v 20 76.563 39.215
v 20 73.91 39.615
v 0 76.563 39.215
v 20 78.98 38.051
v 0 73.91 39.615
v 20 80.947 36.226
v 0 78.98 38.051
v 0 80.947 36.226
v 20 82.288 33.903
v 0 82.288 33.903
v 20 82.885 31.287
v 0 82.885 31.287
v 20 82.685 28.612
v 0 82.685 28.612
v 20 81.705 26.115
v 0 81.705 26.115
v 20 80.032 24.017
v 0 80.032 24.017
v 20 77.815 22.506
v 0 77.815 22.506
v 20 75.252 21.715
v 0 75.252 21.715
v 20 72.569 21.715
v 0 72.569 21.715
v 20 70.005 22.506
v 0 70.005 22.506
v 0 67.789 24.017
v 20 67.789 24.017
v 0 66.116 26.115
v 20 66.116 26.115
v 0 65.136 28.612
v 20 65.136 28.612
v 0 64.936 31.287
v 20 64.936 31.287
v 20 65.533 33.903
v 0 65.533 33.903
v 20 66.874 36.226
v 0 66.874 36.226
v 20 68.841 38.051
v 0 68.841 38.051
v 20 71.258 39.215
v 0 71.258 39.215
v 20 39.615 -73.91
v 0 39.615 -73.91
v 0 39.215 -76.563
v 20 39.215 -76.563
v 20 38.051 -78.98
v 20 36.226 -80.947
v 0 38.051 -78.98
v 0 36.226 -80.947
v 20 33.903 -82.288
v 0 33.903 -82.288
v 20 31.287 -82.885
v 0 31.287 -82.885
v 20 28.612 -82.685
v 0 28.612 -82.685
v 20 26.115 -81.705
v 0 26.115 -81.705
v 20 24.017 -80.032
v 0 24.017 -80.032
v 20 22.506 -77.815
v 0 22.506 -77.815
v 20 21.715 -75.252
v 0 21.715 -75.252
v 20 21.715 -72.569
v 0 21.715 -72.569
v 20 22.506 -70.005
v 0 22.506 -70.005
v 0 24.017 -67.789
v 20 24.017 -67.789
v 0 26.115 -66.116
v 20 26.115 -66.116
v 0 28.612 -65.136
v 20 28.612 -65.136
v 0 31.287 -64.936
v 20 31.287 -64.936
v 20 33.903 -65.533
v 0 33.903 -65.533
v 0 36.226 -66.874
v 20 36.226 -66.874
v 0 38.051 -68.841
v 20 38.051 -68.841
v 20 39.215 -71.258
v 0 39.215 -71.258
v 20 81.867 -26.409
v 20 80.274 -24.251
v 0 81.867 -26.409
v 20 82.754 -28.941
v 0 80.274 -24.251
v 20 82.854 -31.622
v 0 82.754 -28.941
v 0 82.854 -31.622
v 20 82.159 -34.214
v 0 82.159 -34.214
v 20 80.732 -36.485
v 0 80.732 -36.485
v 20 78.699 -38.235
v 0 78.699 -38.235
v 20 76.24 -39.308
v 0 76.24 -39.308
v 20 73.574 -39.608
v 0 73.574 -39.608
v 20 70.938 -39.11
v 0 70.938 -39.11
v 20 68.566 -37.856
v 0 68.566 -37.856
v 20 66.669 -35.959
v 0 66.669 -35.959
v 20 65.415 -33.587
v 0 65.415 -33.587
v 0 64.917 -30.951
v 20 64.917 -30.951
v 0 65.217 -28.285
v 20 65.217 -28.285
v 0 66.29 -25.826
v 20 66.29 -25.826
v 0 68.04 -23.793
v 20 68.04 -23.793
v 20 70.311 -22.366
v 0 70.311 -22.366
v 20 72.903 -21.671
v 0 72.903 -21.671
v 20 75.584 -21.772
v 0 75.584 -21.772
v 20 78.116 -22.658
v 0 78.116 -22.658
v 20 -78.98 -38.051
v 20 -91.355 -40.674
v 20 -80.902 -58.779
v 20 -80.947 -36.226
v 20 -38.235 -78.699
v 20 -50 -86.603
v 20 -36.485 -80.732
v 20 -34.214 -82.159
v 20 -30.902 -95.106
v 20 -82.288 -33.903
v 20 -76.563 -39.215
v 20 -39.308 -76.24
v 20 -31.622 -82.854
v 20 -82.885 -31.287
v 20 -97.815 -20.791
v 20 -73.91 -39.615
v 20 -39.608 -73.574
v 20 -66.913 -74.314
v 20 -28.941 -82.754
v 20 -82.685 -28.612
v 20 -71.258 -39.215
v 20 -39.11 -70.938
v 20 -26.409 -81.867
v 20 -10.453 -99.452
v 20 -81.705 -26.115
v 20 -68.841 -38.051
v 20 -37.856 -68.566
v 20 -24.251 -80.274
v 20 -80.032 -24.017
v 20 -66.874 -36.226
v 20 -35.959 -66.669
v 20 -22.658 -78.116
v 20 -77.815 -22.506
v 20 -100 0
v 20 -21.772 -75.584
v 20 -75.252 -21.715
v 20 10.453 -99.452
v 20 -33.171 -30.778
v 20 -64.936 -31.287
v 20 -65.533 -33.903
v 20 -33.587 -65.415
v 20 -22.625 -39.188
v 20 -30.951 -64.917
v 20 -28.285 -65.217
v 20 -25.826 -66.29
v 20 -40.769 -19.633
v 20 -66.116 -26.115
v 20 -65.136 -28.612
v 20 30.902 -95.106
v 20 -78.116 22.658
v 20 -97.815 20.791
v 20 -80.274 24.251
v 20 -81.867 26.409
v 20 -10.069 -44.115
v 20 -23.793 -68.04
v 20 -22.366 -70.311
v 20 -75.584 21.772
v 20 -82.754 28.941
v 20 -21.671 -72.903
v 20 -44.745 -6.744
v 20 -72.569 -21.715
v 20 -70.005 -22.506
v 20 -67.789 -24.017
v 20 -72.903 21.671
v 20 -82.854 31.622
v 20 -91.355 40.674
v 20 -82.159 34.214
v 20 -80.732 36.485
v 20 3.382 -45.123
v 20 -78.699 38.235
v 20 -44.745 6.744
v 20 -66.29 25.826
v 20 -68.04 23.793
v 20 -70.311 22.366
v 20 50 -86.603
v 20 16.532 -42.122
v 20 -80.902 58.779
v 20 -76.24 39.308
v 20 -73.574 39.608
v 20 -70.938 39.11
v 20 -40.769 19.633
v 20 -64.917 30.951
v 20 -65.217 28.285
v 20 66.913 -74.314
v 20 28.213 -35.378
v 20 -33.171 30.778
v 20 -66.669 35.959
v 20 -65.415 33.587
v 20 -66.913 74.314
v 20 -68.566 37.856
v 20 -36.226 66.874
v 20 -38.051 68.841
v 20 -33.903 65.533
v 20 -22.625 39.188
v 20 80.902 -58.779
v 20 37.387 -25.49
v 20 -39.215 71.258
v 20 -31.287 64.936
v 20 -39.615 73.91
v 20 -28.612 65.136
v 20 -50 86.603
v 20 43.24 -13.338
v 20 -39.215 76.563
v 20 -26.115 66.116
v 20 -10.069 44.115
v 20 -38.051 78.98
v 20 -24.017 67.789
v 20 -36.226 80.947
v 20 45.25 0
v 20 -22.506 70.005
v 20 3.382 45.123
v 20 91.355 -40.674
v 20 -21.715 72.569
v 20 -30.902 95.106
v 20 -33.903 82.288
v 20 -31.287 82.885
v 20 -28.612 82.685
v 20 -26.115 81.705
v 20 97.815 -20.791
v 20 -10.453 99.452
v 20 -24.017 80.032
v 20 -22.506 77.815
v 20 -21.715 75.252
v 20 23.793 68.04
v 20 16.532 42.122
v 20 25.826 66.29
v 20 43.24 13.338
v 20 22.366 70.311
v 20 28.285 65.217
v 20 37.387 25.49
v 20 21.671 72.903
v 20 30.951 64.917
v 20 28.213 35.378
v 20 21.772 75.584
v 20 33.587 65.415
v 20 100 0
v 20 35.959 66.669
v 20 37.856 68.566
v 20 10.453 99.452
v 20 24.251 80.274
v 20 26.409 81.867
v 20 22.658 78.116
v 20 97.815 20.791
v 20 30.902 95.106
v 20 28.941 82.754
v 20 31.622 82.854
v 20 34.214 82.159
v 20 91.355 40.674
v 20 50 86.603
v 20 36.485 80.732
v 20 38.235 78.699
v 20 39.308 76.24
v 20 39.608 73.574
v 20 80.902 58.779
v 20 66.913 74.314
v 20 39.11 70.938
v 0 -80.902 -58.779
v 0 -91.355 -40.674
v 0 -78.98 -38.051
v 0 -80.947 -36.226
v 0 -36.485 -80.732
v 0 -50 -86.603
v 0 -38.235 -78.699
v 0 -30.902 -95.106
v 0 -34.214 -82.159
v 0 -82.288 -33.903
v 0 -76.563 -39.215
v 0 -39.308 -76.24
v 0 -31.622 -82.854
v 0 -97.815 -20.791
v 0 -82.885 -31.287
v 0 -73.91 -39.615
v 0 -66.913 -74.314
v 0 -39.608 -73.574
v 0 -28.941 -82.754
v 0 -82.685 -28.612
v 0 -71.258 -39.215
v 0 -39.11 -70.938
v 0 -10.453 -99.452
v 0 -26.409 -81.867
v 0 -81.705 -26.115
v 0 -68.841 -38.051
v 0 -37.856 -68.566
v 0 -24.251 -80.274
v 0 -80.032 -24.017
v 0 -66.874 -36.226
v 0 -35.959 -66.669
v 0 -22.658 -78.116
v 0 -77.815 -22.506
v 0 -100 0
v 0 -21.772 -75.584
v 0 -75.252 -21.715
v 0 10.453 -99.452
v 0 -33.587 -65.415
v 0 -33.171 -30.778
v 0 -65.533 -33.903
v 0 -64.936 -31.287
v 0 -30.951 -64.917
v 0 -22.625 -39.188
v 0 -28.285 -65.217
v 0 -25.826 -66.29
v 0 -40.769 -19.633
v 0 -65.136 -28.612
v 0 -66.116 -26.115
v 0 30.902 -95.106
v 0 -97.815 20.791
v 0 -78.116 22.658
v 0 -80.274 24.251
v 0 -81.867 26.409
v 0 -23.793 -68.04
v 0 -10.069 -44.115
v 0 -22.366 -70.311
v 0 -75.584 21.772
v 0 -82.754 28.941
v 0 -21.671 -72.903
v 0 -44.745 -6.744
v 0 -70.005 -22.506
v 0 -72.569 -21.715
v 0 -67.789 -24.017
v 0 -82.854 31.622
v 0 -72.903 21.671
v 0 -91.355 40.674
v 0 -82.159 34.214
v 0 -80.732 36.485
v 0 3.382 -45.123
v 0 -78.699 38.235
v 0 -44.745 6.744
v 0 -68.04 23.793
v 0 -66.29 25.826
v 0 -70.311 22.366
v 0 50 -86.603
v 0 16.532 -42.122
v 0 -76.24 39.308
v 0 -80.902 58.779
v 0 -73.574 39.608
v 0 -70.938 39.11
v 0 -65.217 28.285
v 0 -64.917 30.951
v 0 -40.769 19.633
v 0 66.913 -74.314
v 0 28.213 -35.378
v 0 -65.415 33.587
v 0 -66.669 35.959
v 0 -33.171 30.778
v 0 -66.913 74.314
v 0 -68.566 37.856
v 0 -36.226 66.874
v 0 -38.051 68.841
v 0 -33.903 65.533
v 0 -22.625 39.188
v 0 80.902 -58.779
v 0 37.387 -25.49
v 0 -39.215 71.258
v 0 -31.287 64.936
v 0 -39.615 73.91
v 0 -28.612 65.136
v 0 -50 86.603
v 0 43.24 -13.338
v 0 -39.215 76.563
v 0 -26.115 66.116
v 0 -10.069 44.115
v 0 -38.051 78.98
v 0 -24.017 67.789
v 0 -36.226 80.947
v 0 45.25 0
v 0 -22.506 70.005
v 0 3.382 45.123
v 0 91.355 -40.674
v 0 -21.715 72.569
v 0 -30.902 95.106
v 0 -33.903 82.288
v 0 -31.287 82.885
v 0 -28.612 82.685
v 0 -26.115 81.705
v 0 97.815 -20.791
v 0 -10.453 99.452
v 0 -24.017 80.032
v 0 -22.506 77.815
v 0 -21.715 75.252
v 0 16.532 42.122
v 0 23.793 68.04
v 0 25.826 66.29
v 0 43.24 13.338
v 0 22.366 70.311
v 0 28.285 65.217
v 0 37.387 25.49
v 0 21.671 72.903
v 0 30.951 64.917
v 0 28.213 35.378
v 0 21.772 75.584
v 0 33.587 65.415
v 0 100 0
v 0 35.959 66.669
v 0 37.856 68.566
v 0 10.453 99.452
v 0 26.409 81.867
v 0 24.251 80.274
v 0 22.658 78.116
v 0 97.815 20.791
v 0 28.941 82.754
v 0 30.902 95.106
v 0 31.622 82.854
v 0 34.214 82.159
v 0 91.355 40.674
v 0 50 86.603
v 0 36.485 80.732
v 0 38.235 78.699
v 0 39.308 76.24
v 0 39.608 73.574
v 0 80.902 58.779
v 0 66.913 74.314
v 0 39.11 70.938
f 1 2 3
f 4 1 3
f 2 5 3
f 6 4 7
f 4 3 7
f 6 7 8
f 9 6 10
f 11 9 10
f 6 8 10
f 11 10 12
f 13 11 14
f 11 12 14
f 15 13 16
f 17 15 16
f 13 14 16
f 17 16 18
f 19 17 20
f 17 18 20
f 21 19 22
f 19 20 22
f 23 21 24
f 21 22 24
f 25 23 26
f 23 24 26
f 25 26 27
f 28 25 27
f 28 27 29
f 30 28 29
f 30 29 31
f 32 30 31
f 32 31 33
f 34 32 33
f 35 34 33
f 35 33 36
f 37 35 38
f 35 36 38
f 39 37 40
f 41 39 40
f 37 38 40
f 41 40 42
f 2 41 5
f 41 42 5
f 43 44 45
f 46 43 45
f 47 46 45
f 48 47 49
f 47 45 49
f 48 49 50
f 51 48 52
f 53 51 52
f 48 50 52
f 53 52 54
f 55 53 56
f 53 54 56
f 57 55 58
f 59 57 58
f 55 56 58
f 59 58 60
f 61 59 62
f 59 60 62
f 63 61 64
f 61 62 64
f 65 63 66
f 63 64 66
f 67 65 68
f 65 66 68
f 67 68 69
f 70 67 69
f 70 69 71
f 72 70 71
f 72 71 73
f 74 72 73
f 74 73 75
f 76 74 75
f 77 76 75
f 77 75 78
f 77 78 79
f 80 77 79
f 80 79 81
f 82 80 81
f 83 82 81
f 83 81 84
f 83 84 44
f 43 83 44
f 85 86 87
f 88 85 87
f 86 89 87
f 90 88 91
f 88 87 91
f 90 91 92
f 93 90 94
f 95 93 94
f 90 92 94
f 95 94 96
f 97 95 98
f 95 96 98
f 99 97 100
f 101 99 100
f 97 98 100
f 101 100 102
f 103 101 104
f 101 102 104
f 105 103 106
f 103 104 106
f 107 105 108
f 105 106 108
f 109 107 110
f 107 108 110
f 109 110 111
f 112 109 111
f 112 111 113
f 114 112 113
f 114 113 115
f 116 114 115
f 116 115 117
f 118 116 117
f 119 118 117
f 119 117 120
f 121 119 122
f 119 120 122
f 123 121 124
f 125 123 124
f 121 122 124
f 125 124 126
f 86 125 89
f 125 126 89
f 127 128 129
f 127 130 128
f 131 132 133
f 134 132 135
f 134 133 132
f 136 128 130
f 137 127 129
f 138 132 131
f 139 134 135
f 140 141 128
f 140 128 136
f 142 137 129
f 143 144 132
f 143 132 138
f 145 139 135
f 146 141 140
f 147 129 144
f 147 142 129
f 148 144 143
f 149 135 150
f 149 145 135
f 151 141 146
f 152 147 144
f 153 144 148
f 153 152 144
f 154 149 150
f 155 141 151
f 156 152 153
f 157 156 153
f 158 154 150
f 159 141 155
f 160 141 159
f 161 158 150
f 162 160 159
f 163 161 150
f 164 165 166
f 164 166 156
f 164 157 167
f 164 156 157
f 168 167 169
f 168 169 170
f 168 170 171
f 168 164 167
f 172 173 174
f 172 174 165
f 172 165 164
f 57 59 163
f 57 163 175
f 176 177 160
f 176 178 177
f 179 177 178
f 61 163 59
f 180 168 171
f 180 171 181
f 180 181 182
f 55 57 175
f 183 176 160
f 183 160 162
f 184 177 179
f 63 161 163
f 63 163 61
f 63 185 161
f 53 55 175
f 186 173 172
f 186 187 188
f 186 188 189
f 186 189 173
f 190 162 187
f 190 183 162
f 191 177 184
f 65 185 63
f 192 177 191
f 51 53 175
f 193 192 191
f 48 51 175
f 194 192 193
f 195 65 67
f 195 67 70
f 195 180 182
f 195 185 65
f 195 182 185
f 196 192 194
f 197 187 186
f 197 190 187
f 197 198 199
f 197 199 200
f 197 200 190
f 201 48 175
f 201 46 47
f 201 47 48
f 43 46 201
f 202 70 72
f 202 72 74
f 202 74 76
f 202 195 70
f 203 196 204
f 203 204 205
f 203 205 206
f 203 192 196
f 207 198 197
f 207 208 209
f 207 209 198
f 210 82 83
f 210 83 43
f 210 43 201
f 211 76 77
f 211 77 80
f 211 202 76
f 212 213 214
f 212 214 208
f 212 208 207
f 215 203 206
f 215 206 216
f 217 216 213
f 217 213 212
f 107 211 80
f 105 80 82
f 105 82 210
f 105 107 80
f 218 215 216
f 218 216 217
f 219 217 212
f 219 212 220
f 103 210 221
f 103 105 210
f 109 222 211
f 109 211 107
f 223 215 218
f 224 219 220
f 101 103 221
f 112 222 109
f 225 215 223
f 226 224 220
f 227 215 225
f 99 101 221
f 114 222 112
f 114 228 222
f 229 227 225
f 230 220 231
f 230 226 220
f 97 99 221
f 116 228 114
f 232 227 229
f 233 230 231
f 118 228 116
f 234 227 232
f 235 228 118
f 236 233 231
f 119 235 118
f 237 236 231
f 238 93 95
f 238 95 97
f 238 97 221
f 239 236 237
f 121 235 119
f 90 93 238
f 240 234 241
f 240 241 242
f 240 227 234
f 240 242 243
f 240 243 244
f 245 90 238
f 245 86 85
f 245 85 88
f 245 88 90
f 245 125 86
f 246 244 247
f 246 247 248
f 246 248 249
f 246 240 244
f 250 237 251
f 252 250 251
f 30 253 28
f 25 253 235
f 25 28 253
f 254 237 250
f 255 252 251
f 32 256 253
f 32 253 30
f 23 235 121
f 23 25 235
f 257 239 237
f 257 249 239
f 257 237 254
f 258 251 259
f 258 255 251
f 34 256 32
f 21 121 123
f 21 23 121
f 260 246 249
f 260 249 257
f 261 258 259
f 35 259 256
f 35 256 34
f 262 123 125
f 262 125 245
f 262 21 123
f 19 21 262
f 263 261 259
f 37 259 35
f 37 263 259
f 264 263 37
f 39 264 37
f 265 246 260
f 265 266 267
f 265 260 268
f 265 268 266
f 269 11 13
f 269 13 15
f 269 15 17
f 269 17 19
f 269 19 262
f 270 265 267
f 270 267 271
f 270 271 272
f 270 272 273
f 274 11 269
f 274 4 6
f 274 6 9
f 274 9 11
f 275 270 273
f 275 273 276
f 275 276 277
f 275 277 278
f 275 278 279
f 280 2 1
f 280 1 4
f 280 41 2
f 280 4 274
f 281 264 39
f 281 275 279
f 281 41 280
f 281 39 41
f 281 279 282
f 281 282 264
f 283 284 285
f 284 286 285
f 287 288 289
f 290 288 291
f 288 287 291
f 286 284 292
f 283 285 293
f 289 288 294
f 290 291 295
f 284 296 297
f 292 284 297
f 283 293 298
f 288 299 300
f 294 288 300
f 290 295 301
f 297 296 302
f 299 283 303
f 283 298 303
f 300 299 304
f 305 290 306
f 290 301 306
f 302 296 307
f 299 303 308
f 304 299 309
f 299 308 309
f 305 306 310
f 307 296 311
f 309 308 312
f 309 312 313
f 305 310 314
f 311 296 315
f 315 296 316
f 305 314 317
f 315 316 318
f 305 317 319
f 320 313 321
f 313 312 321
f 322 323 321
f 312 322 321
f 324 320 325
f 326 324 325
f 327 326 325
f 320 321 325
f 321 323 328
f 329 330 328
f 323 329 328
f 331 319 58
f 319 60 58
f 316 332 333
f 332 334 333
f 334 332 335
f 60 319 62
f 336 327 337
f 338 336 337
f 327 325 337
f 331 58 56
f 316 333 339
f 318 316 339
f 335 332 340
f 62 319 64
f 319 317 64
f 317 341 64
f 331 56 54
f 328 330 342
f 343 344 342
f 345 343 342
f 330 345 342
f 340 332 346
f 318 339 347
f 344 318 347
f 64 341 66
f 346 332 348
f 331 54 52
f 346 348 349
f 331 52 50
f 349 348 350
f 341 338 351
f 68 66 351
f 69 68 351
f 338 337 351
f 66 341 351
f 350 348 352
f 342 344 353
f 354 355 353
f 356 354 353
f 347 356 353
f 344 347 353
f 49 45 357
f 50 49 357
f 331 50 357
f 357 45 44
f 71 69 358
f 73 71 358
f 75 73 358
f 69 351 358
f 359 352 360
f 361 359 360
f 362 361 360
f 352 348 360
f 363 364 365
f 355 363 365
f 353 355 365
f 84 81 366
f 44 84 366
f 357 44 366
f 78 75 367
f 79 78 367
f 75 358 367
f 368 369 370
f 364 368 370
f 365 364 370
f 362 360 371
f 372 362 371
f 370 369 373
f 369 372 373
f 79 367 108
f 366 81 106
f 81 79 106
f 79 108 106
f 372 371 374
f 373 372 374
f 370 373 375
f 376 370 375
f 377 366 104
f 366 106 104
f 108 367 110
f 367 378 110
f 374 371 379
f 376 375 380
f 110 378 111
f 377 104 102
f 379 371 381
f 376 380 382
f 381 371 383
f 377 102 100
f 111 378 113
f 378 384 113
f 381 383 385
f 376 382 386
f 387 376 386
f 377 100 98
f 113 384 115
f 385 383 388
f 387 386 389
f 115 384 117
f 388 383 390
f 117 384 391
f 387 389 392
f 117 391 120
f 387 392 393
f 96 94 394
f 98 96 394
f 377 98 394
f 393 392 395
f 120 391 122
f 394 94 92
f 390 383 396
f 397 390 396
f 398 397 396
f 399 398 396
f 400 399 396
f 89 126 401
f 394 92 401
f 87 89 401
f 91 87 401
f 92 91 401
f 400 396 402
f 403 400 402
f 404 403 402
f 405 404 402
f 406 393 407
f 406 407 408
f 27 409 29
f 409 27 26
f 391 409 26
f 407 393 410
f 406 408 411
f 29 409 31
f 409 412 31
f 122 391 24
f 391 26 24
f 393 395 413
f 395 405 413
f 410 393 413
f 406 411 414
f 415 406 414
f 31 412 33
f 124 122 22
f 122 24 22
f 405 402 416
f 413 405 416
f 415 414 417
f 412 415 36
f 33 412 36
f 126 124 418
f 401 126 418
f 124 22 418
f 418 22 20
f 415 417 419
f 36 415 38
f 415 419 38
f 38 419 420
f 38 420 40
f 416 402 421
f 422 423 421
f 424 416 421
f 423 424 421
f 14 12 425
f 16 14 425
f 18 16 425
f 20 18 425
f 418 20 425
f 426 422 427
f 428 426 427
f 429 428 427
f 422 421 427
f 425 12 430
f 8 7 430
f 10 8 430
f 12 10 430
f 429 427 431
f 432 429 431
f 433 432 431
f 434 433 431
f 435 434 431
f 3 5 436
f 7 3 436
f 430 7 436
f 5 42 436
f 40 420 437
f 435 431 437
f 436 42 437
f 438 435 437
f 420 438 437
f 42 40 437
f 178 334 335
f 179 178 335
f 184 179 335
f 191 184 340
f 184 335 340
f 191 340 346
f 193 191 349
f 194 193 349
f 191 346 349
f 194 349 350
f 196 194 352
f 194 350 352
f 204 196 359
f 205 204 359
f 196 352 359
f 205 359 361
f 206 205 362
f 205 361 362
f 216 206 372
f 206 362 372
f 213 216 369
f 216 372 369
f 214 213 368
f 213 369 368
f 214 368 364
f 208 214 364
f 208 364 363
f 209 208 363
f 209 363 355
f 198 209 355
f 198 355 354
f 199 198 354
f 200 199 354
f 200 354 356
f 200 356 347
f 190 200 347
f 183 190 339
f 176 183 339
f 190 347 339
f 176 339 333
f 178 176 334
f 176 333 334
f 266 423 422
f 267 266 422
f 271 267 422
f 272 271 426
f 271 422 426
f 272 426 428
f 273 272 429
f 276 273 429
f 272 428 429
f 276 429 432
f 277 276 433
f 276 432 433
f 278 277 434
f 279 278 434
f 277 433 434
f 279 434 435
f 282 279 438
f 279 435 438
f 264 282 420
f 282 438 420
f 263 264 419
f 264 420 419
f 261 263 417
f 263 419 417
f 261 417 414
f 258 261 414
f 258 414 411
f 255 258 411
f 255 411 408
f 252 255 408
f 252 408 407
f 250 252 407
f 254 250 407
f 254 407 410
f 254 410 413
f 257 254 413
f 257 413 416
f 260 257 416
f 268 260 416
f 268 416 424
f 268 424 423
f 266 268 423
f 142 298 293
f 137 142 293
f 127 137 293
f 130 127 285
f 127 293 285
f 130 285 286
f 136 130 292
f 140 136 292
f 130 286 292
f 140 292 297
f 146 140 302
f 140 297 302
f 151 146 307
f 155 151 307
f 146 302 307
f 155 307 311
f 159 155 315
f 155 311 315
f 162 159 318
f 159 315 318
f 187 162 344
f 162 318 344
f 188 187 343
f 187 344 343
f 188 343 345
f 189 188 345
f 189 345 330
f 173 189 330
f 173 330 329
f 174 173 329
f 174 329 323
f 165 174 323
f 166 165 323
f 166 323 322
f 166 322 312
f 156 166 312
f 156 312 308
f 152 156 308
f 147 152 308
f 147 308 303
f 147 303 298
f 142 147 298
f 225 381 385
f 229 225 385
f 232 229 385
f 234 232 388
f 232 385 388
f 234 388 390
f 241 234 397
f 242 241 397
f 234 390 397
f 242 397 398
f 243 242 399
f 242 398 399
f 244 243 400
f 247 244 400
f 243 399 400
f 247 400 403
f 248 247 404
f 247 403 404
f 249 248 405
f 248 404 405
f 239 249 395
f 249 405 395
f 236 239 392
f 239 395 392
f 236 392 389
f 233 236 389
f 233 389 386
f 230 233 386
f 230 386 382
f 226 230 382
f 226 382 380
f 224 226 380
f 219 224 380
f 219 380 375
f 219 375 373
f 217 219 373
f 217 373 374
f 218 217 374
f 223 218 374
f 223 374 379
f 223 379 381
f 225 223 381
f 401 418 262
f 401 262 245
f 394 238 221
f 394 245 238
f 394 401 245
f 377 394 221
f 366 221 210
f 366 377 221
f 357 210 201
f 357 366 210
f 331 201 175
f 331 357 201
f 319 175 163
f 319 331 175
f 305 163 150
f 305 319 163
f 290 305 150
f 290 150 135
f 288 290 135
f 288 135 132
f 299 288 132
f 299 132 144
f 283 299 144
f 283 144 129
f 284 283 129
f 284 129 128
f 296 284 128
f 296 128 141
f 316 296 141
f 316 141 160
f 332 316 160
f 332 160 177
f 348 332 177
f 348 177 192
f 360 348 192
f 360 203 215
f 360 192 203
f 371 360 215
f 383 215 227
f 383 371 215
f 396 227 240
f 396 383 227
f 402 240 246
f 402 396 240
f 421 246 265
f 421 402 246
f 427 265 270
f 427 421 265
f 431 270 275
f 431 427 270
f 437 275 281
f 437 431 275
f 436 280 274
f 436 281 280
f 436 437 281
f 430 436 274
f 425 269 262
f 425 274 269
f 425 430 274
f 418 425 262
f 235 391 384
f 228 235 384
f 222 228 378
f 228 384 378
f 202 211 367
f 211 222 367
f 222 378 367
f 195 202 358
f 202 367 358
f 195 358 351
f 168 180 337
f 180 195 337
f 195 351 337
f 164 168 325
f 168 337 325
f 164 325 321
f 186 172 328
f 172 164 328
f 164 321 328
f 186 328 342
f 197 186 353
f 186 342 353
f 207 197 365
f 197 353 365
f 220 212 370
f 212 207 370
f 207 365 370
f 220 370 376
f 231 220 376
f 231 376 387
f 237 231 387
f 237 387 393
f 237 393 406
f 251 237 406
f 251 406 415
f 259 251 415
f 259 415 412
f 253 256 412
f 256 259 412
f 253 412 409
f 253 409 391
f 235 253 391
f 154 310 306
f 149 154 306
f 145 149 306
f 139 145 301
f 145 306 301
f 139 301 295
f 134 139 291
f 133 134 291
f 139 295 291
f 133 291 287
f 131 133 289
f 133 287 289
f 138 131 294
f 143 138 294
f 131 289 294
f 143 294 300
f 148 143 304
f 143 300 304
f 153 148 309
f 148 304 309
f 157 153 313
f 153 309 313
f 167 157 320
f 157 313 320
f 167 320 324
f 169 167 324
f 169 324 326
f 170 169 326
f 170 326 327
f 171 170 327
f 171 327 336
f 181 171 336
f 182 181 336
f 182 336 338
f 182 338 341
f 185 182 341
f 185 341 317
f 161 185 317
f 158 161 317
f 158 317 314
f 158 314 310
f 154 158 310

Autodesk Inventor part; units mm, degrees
ref_plane "YZ Plane" through (0, 0, 0) normal (1, 0, 0) x (0, 1, 0)
ref_plane "XZ Plane" through (0, 0, 0) normal (0, 1, 0) x (-1, 0, 0)
ref_plane "XY Plane" through (0, 0, 0) normal (0, 0, 1) x (1, 0, 0)
sketch "Sketch1" plane through (0, 0, 0) normal (0, 0, 1) x (1, 0, 0)
  line L0 (20, 100) -> (0, 100)
  line L1 (0, 100) -> (0, 45.25)
  line L2 (0, 45.25) -> (0, 0) construction
  line L3 (0, 0) -> (20, 0) construction
  line L4 (20, 100) -> (20, 45.25)
  line L5 (20, 45.25) -> (0, 45.25)
  line L6 (20, 45.25) -> (20, 0) construction
  dimension "d0" = 200
  dimension "d1" = 20
  dimension "d6" = 90.5
revolve "Revolution1" add sketch "Sketch1" angle 360 about axis through (0, 0, 0) along (1, 0, 0)
sketch "Sketch2" plane through (0, 0, 0) normal (-1, 0, 0) x (0, 0, 1)
  circle A0 centre (0, 0) radius 45.25 projected
  circle A1 centre (0, 0) radius 80 construction
  line L0 (0, 80) -> (0, 0) construction
  circle A2 centre (0, 0) radius 100 projected
  circle A3 centre (30.6147, 73.9104) radius 9
  line L1 (0, 0) -> (30.6147, 73.9104) construction
  dimension "d2" = 160
  dimension "d7" = 18
  dimension "d8" = 22.5
extrude "Extrusion1" cut sketch "Sketch2" against normal through all contours A3
pattern_circular "Circular Pattern1" count 8 over 360 about axis through (10, 0, 0) along (1, 0, 0) of "Extrusion1"
equation "\"d0\" = D"
equation "\"d1\" = C1"
equation "\"d6\" = B1"
equation "\"d2\" = K1"
equation "\"d7\" = L"
equation "\"C1\" = 20"
equation "\"D\" = 200"
equation "\"K1\" = 160"
equation "\"L\" = 18"
equation "\"B1\" = 90.5"
equation "\"NB\" = 1.2345"
equation "\"Size_Designation\" = 1.2345"
properties part number "ISO 7005-1 Plate Flange for Welding Type 01 Flat Face - ISO PN 16 DN80" material "Steel"
